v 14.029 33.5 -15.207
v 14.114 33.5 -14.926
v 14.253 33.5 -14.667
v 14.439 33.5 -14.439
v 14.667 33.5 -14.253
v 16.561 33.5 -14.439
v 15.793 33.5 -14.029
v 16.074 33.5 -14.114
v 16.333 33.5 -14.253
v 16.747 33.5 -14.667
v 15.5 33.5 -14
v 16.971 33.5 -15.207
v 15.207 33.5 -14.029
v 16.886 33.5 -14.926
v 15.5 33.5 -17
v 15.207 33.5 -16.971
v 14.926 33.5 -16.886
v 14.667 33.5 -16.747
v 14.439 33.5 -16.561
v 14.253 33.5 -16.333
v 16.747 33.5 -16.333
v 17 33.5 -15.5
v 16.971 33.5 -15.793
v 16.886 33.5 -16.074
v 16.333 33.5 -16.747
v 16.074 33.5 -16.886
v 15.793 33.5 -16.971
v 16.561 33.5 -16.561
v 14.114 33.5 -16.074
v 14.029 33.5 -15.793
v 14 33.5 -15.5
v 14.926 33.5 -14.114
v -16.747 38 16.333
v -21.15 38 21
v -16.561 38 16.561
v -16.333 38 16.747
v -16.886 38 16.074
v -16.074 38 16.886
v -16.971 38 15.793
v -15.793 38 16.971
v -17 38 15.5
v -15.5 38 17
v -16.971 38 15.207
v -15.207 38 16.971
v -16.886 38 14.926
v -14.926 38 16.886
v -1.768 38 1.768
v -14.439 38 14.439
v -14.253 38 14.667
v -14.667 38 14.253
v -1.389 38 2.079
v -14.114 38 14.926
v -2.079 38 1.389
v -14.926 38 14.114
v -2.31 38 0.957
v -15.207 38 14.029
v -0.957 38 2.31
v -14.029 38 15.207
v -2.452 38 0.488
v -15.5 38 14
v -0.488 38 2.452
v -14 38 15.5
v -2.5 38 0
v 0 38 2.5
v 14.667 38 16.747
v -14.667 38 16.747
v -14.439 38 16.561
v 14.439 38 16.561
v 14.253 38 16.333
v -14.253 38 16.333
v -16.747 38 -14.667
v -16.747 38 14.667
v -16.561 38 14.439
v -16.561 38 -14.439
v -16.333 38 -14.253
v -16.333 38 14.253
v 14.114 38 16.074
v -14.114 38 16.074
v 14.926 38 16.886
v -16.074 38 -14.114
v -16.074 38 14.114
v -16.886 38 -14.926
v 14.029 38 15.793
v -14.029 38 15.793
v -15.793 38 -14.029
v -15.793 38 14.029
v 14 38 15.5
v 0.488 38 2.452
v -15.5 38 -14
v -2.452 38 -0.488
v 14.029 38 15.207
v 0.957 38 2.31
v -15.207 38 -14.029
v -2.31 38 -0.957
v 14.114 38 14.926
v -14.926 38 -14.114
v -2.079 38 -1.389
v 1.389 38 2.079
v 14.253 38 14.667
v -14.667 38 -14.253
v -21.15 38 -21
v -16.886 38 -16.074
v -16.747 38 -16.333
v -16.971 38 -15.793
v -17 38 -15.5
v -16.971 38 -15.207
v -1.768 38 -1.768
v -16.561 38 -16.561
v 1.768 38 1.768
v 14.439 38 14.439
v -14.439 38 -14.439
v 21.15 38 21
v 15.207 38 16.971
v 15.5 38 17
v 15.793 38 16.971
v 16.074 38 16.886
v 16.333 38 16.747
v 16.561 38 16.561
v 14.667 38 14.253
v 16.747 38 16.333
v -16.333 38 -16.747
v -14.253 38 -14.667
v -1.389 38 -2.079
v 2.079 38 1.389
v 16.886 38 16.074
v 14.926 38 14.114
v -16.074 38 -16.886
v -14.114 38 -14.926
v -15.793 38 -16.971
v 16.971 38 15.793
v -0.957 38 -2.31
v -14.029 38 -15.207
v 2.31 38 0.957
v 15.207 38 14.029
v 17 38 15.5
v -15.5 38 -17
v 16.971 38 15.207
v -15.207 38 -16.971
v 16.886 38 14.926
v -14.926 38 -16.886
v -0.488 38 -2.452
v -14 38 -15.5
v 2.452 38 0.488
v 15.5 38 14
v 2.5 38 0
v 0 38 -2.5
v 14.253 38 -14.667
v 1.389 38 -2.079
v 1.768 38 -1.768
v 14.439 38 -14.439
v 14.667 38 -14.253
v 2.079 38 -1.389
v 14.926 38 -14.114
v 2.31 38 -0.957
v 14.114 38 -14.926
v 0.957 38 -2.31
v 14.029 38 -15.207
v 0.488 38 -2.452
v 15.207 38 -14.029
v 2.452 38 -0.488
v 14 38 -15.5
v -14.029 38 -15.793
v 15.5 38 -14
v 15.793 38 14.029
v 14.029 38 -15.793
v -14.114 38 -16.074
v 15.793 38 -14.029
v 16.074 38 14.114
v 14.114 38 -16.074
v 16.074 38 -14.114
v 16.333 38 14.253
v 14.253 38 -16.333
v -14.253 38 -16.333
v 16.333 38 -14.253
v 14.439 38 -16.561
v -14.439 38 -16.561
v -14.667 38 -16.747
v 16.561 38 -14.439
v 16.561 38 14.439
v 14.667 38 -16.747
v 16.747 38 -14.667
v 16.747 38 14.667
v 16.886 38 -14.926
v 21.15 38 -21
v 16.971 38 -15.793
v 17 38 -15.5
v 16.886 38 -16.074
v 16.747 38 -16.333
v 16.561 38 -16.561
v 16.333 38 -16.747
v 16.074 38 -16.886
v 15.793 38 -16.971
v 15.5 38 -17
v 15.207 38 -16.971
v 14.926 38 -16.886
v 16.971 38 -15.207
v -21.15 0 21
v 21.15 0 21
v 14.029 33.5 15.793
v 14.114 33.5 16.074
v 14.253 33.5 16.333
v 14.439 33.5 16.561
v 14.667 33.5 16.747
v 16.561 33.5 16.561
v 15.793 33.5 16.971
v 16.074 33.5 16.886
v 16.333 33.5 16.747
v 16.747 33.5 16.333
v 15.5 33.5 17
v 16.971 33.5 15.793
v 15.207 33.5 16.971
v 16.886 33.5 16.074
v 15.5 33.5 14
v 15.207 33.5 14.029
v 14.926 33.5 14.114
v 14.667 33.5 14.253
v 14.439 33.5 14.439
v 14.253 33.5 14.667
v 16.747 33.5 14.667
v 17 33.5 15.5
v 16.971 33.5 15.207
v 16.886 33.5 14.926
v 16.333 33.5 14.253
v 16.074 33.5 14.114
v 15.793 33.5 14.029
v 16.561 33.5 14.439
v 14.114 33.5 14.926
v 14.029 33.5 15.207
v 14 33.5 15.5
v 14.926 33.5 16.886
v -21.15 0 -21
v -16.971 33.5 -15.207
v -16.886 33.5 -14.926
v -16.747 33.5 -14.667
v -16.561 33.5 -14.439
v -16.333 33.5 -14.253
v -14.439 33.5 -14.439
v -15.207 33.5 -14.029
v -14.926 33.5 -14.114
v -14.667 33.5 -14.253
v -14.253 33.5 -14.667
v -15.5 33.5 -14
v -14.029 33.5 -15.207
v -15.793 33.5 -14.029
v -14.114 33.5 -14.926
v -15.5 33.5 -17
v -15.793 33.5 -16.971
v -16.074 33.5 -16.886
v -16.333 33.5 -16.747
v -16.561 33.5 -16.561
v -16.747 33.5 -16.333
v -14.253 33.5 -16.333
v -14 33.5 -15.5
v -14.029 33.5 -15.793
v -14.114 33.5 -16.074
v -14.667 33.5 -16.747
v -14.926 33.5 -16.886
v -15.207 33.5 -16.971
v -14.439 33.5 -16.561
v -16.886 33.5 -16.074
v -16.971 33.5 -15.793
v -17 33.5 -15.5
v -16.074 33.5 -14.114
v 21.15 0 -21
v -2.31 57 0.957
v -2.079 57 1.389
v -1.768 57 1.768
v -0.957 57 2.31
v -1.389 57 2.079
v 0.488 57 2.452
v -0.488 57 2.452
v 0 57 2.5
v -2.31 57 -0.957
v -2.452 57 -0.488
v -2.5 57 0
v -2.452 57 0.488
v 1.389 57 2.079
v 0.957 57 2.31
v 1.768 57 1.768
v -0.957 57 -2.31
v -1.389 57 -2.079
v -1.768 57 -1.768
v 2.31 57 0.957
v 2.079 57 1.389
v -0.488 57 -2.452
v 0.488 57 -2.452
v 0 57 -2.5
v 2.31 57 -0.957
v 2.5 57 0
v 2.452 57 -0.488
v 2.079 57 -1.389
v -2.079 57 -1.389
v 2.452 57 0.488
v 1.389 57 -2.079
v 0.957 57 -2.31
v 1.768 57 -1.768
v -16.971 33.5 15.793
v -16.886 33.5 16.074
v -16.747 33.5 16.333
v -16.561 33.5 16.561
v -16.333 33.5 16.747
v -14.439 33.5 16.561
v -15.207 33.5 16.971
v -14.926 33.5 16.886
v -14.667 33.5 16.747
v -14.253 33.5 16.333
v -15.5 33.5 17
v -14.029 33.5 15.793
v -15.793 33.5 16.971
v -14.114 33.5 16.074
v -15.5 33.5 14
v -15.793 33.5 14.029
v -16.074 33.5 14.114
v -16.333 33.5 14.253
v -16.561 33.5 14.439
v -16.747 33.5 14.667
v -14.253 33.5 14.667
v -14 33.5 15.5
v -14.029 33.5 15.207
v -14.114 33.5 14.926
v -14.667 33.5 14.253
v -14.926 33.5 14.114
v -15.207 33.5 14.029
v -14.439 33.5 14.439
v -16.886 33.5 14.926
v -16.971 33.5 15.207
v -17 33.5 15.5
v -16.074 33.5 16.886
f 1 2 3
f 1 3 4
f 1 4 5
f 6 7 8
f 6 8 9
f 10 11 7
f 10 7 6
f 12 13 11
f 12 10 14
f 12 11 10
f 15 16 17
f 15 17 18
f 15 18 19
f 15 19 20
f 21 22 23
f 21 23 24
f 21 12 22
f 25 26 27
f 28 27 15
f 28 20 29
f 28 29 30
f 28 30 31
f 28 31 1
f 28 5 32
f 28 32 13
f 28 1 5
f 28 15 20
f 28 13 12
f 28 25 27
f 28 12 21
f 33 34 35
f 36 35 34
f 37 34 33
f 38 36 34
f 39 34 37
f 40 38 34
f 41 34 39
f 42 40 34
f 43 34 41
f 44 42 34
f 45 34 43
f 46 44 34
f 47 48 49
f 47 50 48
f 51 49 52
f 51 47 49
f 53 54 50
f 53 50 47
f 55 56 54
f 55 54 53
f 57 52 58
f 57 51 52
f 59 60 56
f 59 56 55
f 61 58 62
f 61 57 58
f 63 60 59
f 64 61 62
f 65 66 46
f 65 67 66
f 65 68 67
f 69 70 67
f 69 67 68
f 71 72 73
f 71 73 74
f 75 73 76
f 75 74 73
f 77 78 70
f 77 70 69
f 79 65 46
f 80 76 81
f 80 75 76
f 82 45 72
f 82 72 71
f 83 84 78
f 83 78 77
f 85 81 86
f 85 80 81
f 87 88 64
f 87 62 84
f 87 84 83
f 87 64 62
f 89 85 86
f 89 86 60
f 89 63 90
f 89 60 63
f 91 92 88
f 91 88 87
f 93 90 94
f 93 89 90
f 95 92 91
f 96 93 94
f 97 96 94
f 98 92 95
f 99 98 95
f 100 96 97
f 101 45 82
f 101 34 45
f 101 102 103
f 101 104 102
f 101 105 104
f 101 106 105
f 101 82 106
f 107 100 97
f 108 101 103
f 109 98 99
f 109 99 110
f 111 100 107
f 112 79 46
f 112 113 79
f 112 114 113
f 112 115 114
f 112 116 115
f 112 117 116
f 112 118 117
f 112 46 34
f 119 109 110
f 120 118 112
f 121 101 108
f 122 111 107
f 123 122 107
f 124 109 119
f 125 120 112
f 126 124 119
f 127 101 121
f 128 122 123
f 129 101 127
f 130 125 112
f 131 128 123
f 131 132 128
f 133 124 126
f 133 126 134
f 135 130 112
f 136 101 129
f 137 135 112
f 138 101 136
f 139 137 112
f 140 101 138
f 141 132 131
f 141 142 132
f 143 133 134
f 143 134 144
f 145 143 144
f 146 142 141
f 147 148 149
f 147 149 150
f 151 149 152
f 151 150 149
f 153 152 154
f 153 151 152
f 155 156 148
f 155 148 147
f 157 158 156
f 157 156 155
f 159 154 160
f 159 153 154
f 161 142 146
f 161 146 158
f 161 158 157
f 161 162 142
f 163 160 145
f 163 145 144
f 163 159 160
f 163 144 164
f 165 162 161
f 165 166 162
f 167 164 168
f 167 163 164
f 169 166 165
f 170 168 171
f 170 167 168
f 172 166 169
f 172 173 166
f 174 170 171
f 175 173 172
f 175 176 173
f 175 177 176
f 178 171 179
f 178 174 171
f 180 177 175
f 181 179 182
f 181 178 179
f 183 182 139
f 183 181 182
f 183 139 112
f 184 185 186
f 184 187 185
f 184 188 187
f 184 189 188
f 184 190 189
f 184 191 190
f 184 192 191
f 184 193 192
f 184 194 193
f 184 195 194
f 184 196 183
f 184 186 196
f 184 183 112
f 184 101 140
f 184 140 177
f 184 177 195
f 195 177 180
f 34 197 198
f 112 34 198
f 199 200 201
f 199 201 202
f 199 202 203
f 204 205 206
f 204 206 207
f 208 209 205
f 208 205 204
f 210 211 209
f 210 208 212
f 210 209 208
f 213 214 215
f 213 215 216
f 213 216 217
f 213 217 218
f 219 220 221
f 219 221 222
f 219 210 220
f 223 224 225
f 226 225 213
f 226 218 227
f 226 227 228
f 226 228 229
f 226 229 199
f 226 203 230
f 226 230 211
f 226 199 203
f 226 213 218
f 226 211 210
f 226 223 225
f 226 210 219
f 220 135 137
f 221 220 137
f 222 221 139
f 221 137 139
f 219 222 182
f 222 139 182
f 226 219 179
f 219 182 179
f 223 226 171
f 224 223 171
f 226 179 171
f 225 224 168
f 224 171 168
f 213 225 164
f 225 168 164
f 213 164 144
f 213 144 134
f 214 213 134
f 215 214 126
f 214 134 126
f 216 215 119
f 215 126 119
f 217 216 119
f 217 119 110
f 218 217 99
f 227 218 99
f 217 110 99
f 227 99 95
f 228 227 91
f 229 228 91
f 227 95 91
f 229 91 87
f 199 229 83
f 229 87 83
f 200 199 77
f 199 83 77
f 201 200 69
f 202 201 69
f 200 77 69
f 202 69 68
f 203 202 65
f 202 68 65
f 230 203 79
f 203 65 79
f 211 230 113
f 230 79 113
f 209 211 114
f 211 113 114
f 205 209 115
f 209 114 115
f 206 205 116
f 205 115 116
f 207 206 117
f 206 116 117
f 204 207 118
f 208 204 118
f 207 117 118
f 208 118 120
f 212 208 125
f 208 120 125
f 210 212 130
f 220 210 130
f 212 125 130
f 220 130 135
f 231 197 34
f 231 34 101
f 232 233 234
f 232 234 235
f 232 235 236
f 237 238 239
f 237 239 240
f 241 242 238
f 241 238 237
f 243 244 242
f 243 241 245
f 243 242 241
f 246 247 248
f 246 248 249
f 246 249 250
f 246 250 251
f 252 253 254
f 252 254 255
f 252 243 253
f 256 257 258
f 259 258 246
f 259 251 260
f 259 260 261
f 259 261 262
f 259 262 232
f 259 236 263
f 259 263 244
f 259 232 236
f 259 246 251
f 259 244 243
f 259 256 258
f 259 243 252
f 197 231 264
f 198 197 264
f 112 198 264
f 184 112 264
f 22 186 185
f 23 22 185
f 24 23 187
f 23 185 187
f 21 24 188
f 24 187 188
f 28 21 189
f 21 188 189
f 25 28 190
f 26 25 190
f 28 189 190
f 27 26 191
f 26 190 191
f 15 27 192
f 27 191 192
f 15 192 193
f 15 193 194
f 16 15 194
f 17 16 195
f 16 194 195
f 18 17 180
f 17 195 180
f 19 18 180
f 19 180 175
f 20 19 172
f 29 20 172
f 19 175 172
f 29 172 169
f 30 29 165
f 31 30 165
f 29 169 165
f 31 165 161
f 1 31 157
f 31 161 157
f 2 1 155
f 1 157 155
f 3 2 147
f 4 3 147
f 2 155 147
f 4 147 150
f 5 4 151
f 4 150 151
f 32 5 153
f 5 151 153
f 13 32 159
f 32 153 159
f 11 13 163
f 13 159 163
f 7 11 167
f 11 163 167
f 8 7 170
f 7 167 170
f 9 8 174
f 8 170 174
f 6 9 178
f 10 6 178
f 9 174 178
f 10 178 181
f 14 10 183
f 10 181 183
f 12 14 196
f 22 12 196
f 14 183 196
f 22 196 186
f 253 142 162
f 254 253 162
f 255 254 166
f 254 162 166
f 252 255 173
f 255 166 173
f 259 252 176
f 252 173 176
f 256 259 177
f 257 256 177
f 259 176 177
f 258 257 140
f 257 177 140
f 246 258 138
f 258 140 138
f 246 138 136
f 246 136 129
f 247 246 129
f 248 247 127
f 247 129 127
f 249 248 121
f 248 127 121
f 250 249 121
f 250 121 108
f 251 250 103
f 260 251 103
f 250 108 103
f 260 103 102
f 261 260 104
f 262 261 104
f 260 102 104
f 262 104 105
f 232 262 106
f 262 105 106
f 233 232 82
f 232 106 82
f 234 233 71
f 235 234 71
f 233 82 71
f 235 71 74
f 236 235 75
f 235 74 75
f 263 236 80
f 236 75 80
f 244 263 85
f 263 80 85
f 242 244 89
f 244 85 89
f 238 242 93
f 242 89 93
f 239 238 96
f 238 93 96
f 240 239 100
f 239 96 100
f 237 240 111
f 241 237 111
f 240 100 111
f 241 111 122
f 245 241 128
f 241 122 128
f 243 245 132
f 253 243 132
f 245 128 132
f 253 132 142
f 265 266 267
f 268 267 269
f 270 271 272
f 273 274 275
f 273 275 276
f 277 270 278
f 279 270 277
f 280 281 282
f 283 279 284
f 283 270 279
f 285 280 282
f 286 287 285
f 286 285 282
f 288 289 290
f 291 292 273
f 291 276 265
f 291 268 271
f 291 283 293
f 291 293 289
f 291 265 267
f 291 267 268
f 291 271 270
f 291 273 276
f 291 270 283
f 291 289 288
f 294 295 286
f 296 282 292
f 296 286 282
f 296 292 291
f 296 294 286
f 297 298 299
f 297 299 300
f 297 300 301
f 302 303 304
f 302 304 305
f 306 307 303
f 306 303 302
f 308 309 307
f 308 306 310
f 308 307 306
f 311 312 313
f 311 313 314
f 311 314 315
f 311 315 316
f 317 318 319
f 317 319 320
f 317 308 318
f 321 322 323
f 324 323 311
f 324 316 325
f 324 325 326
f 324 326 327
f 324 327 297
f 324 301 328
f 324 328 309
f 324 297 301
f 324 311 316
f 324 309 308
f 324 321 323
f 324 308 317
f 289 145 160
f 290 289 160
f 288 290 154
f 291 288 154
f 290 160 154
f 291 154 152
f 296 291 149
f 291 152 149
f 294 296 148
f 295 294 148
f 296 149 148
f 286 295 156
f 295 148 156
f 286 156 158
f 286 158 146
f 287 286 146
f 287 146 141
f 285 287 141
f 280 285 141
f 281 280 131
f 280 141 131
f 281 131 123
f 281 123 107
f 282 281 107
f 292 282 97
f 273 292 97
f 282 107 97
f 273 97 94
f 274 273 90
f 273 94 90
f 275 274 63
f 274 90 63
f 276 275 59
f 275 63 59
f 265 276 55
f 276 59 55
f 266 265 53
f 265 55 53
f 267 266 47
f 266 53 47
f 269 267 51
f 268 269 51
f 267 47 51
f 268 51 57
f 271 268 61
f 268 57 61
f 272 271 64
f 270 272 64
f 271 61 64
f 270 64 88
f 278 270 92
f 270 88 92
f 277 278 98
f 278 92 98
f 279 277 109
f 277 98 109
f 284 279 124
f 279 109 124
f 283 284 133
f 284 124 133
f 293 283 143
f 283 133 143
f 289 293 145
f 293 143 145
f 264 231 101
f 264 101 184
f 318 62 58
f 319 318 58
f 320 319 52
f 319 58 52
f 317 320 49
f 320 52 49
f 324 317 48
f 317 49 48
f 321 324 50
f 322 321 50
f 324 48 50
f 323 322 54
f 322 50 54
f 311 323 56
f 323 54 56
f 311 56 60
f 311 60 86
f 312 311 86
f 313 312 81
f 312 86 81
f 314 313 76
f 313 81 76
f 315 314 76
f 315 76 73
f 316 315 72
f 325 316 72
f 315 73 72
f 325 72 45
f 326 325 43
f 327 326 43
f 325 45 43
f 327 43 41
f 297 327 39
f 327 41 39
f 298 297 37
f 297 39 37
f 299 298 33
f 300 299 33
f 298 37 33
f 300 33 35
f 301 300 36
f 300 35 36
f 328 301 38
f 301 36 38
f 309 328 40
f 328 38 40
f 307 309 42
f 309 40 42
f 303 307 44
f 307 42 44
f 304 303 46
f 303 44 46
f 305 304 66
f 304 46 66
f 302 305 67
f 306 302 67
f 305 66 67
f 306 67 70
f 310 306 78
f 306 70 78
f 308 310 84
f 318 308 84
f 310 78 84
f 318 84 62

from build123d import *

# Parameters (mm, degrees)
SKETCH1_W           = 42.3
SKETCH1_H           = 42
BOSS_EXTRUDE1_DEPTH = 38
SKETCH2_R           = 2.5
BOSS_EXTRUDE2_DEPTH = 19
SKETCH3_R           = 1.5
CUT_EXTRUDE1_DEPTH  = 4.5


with BuildPart() as part:
    # Sketch1 → Boss-Extrude1 (new body)
    with BuildSketch(Plane(origin=(0, 0, 0), x_dir=(1, 0, 0), z_dir=(0, 1, 0))):
        Rectangle(SKETCH1_W, SKETCH1_H)
    extrude(amount=BOSS_EXTRUDE1_DEPTH)

    # Sketch2 → Boss-Extrude2 (add)
    with BuildSketch(Plane(origin=(0, 38, 0), x_dir=(1, 0, 0), z_dir=(0, 1, 0))):
        Circle(SKETCH2_R)
    extrude(amount=BOSS_EXTRUDE2_DEPTH)

    # Sketch3 → Cut-Extrude1 (cut)
    with BuildSketch(Plane(origin=(0, 38, 0), x_dir=(1, 0, 0), z_dir=(0, 1, 0))):
        with Locations((-15.5, 15.5)):
            Circle(SKETCH3_R)
        with Locations((15.5, 15.5)):
            Circle(SKETCH3_R)
        with Locations((15.5, -15.5)):
            Circle(SKETCH3_R)
        with Locations((-15.5, -15.5)):
            Circle(SKETCH3_R)
    extrude(amount=-CUT_EXTRUDE1_DEPTH, mode=Mode.SUBTRACT)


solid = part.part
